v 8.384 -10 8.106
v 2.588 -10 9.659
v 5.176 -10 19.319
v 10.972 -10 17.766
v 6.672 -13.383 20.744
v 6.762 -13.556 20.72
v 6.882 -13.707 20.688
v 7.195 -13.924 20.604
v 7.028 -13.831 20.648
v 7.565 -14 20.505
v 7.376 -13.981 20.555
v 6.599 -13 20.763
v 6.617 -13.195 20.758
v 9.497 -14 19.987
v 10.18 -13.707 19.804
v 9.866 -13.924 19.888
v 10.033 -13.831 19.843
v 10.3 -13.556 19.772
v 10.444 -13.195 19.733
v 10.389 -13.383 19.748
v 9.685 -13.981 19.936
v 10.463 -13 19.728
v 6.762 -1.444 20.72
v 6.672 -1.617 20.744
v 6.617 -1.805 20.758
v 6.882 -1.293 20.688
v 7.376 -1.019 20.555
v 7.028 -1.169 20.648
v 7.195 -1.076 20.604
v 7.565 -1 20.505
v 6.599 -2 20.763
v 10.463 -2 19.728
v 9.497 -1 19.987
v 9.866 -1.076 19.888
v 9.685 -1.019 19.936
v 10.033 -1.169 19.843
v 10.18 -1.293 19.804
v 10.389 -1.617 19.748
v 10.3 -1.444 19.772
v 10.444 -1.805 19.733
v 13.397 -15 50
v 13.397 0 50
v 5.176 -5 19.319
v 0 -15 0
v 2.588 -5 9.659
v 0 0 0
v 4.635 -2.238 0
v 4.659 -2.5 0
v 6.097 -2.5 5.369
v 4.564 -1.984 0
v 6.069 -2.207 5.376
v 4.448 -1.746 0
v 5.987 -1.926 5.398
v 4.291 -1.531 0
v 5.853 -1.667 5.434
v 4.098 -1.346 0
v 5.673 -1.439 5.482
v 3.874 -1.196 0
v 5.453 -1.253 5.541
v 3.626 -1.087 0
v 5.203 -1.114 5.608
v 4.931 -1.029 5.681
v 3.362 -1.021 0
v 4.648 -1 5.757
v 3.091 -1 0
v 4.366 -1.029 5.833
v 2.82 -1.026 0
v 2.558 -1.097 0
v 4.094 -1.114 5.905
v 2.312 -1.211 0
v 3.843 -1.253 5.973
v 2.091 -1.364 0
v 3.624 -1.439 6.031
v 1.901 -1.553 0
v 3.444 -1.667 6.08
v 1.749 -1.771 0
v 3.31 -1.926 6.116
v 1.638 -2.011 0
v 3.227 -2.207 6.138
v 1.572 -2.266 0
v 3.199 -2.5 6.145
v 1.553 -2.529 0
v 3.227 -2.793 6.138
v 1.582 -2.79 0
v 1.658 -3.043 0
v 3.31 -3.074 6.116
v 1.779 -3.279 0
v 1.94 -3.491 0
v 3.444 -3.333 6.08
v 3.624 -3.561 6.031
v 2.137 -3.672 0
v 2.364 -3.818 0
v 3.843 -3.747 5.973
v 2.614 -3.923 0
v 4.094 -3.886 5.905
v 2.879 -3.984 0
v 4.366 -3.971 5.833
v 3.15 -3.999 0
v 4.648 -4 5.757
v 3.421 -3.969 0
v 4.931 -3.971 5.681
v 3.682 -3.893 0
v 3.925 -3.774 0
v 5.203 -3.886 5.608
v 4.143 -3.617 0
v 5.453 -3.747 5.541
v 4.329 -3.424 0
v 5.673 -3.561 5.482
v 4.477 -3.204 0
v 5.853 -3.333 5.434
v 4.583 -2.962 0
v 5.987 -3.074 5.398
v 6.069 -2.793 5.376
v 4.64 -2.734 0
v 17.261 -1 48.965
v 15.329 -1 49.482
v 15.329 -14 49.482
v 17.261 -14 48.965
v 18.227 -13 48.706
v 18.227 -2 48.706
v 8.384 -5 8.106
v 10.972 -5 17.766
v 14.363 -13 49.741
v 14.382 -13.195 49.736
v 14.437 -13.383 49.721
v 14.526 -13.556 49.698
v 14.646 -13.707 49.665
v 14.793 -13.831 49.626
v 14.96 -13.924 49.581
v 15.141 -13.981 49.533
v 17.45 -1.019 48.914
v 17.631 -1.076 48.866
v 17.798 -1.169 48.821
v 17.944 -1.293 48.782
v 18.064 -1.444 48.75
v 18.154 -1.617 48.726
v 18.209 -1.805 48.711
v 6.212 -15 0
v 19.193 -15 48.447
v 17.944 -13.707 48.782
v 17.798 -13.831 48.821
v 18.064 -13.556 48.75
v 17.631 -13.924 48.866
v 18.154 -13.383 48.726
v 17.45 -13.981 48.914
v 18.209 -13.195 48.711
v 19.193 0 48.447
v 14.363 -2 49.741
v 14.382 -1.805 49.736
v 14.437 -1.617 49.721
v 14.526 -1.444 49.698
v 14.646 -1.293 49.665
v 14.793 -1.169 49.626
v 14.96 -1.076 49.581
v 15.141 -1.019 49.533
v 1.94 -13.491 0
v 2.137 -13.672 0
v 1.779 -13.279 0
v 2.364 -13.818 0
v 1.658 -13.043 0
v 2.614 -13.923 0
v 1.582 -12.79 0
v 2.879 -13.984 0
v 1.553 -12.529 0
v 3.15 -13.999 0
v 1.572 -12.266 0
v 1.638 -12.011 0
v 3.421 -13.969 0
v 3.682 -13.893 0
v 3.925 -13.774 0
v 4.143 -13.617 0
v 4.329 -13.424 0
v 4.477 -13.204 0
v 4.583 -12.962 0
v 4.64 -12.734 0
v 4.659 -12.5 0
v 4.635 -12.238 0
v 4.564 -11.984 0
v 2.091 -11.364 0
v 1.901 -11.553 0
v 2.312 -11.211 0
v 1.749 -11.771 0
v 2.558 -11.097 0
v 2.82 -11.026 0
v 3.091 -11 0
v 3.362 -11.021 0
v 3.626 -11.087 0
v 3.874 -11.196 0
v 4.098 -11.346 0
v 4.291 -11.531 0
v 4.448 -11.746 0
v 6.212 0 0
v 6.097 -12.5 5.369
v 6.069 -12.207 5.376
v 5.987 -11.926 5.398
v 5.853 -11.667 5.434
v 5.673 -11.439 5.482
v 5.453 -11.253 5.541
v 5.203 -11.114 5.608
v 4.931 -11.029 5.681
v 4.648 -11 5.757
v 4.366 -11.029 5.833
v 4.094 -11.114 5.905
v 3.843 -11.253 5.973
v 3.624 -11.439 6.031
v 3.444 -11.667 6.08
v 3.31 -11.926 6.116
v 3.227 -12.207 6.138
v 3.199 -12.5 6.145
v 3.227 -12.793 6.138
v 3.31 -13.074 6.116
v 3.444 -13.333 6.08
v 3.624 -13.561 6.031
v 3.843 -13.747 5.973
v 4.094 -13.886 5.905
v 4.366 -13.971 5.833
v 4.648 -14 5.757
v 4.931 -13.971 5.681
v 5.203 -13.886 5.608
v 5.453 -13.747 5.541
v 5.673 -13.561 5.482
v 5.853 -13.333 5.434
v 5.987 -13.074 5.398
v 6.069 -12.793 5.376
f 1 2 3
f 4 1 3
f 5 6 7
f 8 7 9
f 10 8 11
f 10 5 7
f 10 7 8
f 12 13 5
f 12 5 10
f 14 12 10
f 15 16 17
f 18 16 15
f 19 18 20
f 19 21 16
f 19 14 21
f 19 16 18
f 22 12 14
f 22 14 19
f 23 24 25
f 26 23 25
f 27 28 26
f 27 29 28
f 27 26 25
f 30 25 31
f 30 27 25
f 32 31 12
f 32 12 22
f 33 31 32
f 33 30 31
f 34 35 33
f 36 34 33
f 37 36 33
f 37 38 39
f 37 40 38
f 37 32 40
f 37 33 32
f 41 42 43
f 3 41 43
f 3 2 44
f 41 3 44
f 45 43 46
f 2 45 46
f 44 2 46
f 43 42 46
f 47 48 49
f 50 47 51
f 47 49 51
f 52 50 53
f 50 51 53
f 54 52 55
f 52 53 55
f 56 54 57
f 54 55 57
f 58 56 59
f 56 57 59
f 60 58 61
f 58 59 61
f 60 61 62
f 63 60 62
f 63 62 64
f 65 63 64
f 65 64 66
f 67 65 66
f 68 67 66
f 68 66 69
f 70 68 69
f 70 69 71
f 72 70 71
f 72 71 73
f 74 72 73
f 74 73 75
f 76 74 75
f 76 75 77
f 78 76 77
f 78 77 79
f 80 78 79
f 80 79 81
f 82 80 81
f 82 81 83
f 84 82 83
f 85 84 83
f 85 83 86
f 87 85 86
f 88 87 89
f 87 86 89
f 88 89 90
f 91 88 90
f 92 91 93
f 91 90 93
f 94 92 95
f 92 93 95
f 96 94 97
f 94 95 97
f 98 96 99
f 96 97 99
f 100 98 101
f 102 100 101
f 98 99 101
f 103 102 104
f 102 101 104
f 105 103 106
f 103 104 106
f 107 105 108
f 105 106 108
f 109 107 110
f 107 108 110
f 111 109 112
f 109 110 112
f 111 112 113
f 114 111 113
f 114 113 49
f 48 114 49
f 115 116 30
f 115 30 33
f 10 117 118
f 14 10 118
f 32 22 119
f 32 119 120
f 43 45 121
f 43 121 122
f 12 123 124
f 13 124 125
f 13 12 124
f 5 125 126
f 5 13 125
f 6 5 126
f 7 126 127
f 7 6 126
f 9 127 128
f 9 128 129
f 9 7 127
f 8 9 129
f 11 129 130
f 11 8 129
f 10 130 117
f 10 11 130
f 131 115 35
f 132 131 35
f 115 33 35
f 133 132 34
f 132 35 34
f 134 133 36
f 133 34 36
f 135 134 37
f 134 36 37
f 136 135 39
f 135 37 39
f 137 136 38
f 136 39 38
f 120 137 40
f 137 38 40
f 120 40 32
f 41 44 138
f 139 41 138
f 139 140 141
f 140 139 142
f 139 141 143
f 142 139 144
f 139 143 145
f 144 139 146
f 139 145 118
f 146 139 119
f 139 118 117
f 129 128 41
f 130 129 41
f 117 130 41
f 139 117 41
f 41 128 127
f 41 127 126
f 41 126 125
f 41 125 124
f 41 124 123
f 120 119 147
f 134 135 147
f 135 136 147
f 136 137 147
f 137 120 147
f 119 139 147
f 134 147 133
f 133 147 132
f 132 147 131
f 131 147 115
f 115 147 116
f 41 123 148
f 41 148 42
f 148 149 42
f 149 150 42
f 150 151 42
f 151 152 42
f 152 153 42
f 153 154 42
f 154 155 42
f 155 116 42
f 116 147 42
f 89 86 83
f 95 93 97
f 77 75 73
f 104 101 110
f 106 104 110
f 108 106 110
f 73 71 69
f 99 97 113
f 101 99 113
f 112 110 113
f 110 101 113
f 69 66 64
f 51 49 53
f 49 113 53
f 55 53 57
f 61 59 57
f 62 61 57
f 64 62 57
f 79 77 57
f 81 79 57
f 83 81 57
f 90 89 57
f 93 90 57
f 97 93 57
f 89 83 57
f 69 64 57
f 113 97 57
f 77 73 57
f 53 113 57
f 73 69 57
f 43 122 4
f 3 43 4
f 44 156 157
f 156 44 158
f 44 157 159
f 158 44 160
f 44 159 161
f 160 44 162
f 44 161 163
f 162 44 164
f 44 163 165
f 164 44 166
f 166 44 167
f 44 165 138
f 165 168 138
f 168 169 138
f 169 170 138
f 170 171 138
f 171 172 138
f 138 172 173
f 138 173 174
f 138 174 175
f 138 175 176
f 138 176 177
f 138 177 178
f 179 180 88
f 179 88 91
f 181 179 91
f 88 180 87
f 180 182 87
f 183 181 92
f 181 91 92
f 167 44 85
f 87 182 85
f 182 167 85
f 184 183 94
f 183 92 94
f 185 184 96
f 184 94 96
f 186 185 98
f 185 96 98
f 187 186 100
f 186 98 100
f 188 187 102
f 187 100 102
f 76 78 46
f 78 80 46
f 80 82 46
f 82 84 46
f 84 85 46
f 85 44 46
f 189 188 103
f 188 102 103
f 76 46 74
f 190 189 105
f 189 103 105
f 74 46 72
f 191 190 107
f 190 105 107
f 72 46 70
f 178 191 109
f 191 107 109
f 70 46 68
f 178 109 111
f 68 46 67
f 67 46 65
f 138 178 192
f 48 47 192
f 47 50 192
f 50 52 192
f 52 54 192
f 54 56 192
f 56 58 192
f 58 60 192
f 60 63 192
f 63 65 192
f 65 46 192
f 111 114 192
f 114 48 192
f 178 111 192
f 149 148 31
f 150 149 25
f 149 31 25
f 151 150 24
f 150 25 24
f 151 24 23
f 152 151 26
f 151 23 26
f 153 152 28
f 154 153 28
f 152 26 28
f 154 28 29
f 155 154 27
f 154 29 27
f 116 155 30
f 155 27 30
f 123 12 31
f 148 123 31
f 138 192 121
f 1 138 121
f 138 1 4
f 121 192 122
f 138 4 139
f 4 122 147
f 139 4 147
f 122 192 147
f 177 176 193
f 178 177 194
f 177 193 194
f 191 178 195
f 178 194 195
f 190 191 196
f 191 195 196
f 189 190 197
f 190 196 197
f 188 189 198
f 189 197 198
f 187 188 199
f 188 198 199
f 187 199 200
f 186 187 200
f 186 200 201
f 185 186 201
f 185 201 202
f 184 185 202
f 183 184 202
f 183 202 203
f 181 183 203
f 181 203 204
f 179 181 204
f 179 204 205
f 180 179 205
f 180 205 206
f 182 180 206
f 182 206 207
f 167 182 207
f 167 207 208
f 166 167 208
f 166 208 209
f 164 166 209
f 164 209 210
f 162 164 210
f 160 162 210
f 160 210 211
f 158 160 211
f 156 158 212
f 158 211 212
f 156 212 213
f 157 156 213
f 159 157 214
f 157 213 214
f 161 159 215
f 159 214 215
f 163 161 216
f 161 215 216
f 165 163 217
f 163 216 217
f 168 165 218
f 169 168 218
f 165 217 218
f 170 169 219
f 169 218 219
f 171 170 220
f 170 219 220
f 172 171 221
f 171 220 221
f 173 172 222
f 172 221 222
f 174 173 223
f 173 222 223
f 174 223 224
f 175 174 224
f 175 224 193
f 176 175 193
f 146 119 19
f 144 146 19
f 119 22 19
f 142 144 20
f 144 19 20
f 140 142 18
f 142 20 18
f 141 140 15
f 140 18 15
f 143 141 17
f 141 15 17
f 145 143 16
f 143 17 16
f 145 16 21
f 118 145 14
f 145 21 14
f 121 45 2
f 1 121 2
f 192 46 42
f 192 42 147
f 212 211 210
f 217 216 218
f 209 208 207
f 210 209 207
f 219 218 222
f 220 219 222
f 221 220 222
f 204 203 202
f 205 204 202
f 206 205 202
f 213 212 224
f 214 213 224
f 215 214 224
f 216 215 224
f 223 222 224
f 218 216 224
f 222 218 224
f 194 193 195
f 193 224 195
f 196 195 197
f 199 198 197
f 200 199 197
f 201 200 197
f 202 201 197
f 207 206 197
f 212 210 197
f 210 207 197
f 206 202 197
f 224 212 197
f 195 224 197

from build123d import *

# Parameters (mm, degrees)
F1_DEPTH = 15
F3_START = -45
F2_R     = 1.5
F3_DEPTH = 10
F4_W     = 4
F4_H     = 13
F5_DEPTH = 30
F6_W     = 5
F6_H     = 10
F7_DEPTH = 18.5400284665
F8_R     = 1


with BuildPart() as f1:
    # F0 (on Front) → F1 (new body)
    with BuildSketch(Plane.XZ):
        Polygon((13.3974596216, 50), (0, 0), (6.2116570825, 0), (19.1930145793, 48.4470857294), align=None)
    extrude(amount=F1_DEPTH)

    # F2 (on face) → F3 (cut)
    with BuildSketch(Plane(origin=(13.3974596216, 0, 50), x_dir=(0.9659258263, 0, -0.2588190451), z_dir=(0.2588190451, 0, 0.9659258263)).offset(F3_START)):
        with Locations((3, -12.5)):
            Circle(F2_R)
        with Locations((3, -2.5)):
            Circle(F2_R)
    extrude(amount=-F3_DEPTH, mode=Mode.SUBTRACT)

    # F4 (on face) → F5 (cut)
    with BuildSketch(Plane(origin=(13.3974596216, 0, 50), x_dir=(0.9659258263, 0, -0.2588190451), z_dir=(0.2588190451, 0, 0.9659258263))):
        with Locations((3, -7.5)):
            Rectangle(F4_W, F4_H)
    extrude(amount=-F5_DEPTH, mode=Mode.SUBTRACT)

    # F6 (on face) → F7 (cut, through all)
    with BuildSketch(Plane(origin=(0, 0, 0), x_dir=(0, -1, 0), z_dir=(-0.9659258263, 0, 0.2588190451))):
        with Locations((7.5, 15)):
            Rectangle(F6_W, F6_H)
    extrude(amount=-F7_DEPTH, mode=Mode.SUBTRACT)

    # F8
    f8_edges = [f1.edges().sort_by_distance(p)[0] for p in [
        (10.4811, -1, 35.252294),
        (14.344803, -14, 34.217017),
        (10.4811, -14, 35.252294),
        (14.344803, -1, 34.217017),
    ]]
    fillet(f8_edges, radius=F8_R)


solid = f1.part
